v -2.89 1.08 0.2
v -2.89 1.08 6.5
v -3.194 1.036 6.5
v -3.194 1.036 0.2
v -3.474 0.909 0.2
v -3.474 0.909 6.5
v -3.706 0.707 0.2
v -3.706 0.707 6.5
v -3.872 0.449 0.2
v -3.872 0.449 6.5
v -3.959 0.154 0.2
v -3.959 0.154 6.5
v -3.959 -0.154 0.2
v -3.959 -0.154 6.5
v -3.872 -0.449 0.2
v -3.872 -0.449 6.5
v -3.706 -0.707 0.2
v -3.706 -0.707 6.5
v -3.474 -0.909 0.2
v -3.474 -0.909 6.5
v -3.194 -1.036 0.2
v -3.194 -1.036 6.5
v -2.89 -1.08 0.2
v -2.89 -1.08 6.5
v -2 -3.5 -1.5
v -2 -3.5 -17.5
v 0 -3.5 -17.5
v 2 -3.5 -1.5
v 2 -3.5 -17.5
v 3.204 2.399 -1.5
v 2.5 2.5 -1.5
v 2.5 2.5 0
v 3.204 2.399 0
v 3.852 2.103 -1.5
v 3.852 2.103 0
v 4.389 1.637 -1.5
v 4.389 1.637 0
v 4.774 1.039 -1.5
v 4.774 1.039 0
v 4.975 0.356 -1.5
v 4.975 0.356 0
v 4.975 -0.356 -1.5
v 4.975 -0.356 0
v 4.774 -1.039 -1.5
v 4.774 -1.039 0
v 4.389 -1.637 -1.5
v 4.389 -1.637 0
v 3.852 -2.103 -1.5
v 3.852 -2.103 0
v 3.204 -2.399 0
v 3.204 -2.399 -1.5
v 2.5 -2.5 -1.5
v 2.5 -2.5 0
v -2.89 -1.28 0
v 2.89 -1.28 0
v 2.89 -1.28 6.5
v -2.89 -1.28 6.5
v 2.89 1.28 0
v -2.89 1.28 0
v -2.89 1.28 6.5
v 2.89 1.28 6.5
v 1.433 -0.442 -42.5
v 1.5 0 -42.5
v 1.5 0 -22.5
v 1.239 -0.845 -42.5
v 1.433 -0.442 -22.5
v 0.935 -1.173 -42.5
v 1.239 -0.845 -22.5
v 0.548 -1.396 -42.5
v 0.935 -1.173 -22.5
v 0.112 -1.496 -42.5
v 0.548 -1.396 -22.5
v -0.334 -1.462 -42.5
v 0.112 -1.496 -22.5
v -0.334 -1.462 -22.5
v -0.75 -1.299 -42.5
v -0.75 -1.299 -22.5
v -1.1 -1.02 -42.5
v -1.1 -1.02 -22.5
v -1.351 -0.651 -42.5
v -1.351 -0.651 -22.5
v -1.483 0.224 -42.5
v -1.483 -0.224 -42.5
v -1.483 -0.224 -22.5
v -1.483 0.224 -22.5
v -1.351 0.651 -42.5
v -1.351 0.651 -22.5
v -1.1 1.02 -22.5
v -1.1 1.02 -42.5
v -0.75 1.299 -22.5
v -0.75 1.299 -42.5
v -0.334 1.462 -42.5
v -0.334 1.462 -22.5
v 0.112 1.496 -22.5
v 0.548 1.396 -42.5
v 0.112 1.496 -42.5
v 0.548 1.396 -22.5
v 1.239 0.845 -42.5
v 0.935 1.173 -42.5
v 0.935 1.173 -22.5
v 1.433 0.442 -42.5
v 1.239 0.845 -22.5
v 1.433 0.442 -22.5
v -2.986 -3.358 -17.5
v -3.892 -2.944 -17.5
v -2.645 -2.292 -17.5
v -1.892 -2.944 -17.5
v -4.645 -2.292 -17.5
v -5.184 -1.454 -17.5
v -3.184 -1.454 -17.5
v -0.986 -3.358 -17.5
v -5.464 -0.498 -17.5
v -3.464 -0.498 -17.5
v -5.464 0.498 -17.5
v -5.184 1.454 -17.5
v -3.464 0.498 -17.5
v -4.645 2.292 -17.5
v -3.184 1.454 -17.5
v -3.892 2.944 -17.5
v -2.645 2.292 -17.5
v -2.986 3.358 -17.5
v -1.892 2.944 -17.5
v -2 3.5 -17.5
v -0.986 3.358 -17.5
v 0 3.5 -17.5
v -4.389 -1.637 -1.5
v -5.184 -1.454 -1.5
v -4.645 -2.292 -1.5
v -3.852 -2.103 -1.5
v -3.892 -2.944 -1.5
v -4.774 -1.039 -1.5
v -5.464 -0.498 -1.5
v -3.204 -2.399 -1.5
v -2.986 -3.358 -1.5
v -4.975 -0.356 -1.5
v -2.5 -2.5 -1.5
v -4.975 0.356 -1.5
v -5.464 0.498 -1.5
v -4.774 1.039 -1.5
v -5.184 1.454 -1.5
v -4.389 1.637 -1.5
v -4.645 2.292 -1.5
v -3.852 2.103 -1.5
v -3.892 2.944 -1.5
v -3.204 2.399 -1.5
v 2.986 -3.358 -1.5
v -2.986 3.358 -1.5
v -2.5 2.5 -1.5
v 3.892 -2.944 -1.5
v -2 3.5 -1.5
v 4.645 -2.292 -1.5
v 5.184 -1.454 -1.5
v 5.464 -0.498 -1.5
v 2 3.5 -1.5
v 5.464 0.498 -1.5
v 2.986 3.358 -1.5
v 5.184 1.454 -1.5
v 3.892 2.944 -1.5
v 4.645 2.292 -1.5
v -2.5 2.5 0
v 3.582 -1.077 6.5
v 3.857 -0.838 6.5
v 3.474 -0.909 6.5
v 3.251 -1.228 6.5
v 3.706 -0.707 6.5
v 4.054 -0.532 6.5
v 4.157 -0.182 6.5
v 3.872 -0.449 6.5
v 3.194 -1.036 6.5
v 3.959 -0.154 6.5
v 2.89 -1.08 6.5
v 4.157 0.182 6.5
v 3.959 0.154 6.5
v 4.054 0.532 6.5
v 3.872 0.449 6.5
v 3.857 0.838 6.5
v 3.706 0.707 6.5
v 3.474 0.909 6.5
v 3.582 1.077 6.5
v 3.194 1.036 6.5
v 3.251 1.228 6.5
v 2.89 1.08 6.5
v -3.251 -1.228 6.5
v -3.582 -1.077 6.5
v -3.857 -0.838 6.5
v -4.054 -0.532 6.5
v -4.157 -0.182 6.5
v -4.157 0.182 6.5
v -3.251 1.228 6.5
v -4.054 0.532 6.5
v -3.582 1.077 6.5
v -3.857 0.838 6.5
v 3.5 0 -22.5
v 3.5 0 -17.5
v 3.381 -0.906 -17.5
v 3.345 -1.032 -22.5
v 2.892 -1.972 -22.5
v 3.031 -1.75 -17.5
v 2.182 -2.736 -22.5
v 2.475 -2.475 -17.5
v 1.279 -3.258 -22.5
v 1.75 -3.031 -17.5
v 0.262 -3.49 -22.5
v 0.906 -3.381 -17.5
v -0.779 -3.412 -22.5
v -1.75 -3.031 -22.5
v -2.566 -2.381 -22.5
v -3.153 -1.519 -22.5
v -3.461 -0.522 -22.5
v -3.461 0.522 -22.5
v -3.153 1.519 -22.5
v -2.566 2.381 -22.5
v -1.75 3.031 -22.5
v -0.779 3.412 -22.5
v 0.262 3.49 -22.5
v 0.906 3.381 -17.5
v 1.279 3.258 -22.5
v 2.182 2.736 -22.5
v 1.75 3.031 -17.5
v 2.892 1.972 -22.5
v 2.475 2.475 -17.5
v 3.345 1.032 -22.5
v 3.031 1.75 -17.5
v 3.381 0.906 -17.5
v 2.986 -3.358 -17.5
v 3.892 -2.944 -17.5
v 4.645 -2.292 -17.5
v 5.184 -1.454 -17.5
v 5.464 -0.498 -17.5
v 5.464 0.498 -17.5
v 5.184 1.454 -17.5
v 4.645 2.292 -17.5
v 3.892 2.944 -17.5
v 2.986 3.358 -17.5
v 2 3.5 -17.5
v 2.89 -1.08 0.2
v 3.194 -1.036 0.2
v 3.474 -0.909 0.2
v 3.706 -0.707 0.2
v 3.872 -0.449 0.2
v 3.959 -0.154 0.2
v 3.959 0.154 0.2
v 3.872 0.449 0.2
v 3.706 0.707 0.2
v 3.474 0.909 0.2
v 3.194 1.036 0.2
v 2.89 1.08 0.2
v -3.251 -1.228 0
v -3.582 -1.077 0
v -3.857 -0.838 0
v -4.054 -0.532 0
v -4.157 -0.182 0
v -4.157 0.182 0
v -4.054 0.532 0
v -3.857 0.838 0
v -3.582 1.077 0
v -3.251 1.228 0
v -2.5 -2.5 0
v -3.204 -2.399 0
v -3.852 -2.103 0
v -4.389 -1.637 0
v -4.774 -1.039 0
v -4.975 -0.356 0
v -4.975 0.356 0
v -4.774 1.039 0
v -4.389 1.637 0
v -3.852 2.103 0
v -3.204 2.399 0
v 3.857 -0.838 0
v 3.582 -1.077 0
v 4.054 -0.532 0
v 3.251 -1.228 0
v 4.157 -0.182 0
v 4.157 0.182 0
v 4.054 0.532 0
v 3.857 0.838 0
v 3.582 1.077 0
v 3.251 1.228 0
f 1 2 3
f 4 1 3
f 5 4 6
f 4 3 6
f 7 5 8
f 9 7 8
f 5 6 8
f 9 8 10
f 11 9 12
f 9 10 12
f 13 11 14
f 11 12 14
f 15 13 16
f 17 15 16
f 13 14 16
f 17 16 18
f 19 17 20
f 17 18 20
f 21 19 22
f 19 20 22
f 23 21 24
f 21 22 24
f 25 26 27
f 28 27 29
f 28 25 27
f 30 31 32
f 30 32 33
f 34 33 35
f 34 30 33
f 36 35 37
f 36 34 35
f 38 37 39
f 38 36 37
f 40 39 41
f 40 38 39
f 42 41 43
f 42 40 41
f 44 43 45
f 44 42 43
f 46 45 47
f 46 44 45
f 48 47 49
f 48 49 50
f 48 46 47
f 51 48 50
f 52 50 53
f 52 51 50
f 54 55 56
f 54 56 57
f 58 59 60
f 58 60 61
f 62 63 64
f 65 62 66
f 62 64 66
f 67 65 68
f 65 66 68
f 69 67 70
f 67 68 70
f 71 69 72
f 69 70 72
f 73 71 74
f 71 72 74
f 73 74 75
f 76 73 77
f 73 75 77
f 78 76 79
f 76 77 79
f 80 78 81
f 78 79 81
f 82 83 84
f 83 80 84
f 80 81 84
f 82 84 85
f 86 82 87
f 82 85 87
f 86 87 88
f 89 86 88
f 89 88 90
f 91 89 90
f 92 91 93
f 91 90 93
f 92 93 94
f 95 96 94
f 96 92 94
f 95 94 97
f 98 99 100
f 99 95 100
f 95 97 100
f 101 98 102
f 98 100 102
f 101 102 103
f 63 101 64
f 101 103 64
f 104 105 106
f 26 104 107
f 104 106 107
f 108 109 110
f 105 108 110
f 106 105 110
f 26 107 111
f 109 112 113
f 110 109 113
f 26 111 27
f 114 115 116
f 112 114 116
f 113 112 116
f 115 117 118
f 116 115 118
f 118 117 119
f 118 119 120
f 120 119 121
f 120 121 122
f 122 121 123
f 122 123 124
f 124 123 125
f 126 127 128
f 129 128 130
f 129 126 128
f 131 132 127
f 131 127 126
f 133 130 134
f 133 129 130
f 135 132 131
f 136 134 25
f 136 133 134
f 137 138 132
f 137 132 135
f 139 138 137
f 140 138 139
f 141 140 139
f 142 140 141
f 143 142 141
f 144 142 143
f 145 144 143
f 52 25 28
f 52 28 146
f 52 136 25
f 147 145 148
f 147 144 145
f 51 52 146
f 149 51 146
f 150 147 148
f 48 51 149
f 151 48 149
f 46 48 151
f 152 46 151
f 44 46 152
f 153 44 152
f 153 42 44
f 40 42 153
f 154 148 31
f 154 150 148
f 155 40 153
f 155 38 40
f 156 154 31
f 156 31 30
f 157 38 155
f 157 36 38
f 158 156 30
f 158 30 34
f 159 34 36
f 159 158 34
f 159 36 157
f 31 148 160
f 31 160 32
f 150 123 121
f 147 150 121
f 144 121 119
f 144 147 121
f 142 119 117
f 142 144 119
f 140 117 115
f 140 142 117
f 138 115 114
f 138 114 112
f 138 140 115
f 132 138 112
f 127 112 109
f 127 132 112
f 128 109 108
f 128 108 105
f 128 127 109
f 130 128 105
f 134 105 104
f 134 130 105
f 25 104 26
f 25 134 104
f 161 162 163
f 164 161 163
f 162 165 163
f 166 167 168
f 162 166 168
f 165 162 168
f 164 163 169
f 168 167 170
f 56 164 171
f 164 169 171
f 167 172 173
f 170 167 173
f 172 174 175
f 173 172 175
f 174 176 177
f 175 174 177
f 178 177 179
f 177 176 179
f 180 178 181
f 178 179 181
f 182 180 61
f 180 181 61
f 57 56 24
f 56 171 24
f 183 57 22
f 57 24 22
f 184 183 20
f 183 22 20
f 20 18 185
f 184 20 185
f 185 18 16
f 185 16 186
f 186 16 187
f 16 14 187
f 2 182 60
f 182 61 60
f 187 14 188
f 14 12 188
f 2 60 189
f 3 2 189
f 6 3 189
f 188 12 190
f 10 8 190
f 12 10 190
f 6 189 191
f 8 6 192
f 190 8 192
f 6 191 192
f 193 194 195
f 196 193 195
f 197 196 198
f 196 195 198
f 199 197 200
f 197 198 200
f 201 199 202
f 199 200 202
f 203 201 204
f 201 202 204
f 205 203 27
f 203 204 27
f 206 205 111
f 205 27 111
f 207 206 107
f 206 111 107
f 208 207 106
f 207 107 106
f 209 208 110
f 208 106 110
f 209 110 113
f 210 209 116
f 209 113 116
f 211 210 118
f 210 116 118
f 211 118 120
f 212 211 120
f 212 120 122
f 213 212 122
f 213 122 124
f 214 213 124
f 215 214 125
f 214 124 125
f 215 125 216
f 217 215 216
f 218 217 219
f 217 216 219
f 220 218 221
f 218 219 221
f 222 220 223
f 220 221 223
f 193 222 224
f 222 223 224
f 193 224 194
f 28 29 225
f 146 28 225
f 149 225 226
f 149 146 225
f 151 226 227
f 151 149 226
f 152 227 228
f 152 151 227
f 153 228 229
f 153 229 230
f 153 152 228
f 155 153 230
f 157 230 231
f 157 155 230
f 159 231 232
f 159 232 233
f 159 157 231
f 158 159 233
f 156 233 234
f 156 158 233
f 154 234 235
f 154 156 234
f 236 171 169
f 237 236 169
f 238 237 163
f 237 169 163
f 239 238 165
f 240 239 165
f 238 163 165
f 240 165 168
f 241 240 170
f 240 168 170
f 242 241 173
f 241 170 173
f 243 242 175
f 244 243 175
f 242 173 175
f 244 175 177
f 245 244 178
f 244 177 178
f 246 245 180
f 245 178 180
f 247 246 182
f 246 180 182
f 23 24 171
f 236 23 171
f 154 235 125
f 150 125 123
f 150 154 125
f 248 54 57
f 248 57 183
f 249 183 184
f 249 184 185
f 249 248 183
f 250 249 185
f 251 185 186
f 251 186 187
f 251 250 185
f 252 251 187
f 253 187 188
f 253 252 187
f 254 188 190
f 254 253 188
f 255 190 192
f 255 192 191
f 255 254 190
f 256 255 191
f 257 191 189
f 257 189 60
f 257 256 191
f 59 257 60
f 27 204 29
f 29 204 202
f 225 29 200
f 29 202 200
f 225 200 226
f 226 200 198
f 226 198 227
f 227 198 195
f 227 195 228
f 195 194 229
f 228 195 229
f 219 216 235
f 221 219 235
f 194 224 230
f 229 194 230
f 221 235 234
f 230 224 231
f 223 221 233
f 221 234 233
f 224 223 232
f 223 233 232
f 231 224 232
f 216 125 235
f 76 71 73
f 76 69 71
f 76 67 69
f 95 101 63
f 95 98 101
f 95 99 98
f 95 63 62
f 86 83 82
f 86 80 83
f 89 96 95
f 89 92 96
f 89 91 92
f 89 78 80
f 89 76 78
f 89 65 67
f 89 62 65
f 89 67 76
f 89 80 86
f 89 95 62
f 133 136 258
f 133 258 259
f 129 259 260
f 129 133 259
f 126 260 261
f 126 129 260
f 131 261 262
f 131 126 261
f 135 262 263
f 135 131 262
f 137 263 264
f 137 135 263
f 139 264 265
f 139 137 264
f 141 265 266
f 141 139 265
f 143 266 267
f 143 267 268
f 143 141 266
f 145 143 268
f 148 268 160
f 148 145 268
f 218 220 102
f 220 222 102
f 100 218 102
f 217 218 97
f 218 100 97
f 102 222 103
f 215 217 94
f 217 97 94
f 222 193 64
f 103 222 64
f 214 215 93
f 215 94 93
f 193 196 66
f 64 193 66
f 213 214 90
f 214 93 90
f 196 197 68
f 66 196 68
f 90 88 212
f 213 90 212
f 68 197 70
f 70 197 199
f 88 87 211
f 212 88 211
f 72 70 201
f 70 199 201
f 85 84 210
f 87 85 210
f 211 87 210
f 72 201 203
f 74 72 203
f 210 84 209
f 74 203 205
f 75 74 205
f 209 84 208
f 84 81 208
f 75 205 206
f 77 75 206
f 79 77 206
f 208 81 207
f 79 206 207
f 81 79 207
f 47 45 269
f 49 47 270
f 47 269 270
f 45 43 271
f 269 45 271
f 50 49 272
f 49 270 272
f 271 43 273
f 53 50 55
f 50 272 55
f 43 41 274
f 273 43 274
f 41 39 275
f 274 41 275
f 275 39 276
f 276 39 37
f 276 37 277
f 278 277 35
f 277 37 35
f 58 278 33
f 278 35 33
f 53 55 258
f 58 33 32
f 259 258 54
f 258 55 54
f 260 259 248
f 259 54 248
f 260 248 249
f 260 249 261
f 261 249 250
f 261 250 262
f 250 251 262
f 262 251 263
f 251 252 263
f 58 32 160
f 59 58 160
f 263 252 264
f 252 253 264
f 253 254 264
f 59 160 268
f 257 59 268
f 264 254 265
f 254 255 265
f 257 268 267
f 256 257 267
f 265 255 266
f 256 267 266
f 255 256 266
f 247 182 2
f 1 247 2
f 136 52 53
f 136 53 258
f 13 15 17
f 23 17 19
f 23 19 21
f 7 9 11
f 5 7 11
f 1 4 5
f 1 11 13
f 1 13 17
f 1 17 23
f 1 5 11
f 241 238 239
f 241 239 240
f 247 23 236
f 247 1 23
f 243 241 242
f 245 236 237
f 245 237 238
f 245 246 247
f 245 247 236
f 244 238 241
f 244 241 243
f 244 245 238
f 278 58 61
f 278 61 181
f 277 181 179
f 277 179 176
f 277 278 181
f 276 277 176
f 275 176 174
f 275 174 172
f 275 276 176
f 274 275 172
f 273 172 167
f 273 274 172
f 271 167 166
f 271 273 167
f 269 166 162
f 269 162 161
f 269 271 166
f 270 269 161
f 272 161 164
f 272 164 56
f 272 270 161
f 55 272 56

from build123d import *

# Parameters (mm, degrees)
BOSS_EXTRUDE1_DEPTH = 16
BOSS_EXTRUDE2_DEPTH = 1.5
BOSS_EXTRUDE3_DEPTH = 6.5
CUT_EXTRUDE1_DEPTH  = 6.3
SKETCH6_R           = 1.5
CUT_EXTRUDE2_DEPTH  = 80


with BuildPart() as part:
    # Sketch1 → Boss-Extrude1 (new body)
    with BuildSketch(Plane.XY.offset(-1.5)):
        with BuildLine():
            Line((2, 3.5), (-2, 3.5))
            ThreePointArc((-2, 3.5), (-5.5, 0), (-2, -3.5))
            Line((-2, -3.5), (2, -3.5))
            ThreePointArc((2, -3.5), (5.5, 0), (2, 3.5))
        make_face()
    extrude(amount=-BOSS_EXTRUDE1_DEPTH)

    # Sketch2 → Boss-Extrude2 (add)
    with BuildSketch(Plane.XY.offset(-1.5)):
        with BuildLine():
            Line((2.5, -2.5), (-2.5, -2.5))
            ThreePointArc((-2.5, -2.5), (-5, 0), (-2.5, 2.5))
            Line((-2.5, 2.5), (2.5, 2.5))
            ThreePointArc((2.5, 2.5), (5, 0), (2.5, -2.5))
        make_face()
    extrude(amount=BOSS_EXTRUDE2_DEPTH)

    # Sketch3 → Boss-Extrude3 (add)
    with BuildSketch(Plane.XY):
        with BuildLine():
            Line((2.89, -1.28), (-2.89, -1.28))
            ThreePointArc((-2.89, -1.28), (-4.17, 0), (-2.89, 1.28))
            Line((-2.89, 1.28), (2.89, 1.28))
            ThreePointArc((2.89, 1.28), (4.17, 0), (2.89, -1.28))
        make_face()
    extrude(amount=BOSS_EXTRUDE3_DEPTH)

    # Sketch4 → Cut-Extrude1 (cut)
    with BuildSketch(Plane.XY.offset(6.5)):
        with BuildLine():
            Line((2.89, 1.08), (-2.89, 1.08))
            ThreePointArc((-2.89, 1.08), (-3.97, 0), (-2.89, -1.08))
            Line((-2.89, -1.08), (2.89, -1.08))
            ThreePointArc((2.89, -1.08), (3.97, 0), (2.89, 1.08))
        make_face()
    extrude(amount=-CUT_EXTRUDE1_DEPTH, mode=Mode.SUBTRACT)

    # Sketch5 → Revolve1 (revolve)
    with BuildSketch(Plane.XZ):
        Polygon((3.5, -17.5), (0, -17.5), (0, -122.5), (1.5, -122.5), (1.5, -22.5), (3.5, -22.5), align=None)
    revolve(axis=Axis((0, 0, -17.5), (0, 0, -1)))

    # Sketch6 → Cut-Extrude2 (cut)
    with BuildSketch(Plane(origin=(0, 0, -122.5), x_dir=(-1, 0, 0), z_dir=(0, 0, -1))):
        Circle(SKETCH6_R)
    extrude(amount=-CUT_EXTRUDE2_DEPTH, mode=Mode.SUBTRACT)


solid = part.part
